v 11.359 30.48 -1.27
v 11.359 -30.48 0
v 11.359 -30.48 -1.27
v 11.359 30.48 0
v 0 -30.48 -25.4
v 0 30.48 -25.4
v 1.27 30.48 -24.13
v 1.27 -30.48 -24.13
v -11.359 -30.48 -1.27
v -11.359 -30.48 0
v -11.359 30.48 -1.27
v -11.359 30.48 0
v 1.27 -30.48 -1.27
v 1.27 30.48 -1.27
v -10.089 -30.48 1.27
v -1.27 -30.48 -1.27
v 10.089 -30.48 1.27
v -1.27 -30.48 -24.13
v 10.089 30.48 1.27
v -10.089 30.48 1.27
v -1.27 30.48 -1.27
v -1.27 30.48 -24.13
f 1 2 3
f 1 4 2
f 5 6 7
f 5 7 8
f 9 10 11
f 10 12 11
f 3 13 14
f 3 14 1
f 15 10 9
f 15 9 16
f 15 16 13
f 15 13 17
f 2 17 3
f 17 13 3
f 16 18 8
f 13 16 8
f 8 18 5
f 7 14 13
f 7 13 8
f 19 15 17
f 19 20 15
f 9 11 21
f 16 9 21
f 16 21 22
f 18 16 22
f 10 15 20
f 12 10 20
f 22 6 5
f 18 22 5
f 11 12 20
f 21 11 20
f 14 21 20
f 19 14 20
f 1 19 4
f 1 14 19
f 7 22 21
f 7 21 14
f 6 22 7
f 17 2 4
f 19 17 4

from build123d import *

# Parameters (mm, degrees)
SKETCH2_W             = 22.718450652
SKETCH2_H             = 2.54
EXTRUDE_THIN1_DEPTH   = 30.48
SKETCH2_W_2           = 2.54
SKETCH2_H_2           = 25.4
EXTRUDE_THIN1_2_DEPTH = 30.48
CHAMFER1_SIZE         = 1.27


with BuildPart() as part:
    # Sketch2 → Extrude-Thin1 (new, symmetric)
    with BuildSketch(Plane(origin=(0, 0, 0), x_dir=(1, 0, 0), z_dir=(0, 1, 0))):
        Rectangle(SKETCH2_W, SKETCH2_H)
    extrude(amount=EXTRUDE_THIN1_DEPTH, both=True)


with BuildPart() as body_2:
    # Sketch2 → Extrude-Thin1 2 (new, symmetric)
    with BuildSketch(Plane(origin=(0, 0, 0), x_dir=(1, 0, 0), z_dir=(0, 1, 0))):
        with Locations((0, 12.7)):
            Rectangle(SKETCH2_W_2, SKETCH2_H_2)
    extrude(amount=EXTRUDE_THIN1_2_DEPTH, both=True)

    # Combine1: union part
    add(part.part)

    # Chamfer1
    chamfer1_edges = [body_2.edges().sort_by_distance(p)[0] for p in [
        (-11.359225326, 0, 1.27),
        (11.359225326, 0, 1.27),
        (1.27, 0, -25.4),
        (-1.27, 0, -25.4),
    ]]
    chamfer(chamfer1_edges, length=CHAMFER1_SIZE - 0.0001)  # a hair under: the kernel refuses the full size


solid = body_2.part
